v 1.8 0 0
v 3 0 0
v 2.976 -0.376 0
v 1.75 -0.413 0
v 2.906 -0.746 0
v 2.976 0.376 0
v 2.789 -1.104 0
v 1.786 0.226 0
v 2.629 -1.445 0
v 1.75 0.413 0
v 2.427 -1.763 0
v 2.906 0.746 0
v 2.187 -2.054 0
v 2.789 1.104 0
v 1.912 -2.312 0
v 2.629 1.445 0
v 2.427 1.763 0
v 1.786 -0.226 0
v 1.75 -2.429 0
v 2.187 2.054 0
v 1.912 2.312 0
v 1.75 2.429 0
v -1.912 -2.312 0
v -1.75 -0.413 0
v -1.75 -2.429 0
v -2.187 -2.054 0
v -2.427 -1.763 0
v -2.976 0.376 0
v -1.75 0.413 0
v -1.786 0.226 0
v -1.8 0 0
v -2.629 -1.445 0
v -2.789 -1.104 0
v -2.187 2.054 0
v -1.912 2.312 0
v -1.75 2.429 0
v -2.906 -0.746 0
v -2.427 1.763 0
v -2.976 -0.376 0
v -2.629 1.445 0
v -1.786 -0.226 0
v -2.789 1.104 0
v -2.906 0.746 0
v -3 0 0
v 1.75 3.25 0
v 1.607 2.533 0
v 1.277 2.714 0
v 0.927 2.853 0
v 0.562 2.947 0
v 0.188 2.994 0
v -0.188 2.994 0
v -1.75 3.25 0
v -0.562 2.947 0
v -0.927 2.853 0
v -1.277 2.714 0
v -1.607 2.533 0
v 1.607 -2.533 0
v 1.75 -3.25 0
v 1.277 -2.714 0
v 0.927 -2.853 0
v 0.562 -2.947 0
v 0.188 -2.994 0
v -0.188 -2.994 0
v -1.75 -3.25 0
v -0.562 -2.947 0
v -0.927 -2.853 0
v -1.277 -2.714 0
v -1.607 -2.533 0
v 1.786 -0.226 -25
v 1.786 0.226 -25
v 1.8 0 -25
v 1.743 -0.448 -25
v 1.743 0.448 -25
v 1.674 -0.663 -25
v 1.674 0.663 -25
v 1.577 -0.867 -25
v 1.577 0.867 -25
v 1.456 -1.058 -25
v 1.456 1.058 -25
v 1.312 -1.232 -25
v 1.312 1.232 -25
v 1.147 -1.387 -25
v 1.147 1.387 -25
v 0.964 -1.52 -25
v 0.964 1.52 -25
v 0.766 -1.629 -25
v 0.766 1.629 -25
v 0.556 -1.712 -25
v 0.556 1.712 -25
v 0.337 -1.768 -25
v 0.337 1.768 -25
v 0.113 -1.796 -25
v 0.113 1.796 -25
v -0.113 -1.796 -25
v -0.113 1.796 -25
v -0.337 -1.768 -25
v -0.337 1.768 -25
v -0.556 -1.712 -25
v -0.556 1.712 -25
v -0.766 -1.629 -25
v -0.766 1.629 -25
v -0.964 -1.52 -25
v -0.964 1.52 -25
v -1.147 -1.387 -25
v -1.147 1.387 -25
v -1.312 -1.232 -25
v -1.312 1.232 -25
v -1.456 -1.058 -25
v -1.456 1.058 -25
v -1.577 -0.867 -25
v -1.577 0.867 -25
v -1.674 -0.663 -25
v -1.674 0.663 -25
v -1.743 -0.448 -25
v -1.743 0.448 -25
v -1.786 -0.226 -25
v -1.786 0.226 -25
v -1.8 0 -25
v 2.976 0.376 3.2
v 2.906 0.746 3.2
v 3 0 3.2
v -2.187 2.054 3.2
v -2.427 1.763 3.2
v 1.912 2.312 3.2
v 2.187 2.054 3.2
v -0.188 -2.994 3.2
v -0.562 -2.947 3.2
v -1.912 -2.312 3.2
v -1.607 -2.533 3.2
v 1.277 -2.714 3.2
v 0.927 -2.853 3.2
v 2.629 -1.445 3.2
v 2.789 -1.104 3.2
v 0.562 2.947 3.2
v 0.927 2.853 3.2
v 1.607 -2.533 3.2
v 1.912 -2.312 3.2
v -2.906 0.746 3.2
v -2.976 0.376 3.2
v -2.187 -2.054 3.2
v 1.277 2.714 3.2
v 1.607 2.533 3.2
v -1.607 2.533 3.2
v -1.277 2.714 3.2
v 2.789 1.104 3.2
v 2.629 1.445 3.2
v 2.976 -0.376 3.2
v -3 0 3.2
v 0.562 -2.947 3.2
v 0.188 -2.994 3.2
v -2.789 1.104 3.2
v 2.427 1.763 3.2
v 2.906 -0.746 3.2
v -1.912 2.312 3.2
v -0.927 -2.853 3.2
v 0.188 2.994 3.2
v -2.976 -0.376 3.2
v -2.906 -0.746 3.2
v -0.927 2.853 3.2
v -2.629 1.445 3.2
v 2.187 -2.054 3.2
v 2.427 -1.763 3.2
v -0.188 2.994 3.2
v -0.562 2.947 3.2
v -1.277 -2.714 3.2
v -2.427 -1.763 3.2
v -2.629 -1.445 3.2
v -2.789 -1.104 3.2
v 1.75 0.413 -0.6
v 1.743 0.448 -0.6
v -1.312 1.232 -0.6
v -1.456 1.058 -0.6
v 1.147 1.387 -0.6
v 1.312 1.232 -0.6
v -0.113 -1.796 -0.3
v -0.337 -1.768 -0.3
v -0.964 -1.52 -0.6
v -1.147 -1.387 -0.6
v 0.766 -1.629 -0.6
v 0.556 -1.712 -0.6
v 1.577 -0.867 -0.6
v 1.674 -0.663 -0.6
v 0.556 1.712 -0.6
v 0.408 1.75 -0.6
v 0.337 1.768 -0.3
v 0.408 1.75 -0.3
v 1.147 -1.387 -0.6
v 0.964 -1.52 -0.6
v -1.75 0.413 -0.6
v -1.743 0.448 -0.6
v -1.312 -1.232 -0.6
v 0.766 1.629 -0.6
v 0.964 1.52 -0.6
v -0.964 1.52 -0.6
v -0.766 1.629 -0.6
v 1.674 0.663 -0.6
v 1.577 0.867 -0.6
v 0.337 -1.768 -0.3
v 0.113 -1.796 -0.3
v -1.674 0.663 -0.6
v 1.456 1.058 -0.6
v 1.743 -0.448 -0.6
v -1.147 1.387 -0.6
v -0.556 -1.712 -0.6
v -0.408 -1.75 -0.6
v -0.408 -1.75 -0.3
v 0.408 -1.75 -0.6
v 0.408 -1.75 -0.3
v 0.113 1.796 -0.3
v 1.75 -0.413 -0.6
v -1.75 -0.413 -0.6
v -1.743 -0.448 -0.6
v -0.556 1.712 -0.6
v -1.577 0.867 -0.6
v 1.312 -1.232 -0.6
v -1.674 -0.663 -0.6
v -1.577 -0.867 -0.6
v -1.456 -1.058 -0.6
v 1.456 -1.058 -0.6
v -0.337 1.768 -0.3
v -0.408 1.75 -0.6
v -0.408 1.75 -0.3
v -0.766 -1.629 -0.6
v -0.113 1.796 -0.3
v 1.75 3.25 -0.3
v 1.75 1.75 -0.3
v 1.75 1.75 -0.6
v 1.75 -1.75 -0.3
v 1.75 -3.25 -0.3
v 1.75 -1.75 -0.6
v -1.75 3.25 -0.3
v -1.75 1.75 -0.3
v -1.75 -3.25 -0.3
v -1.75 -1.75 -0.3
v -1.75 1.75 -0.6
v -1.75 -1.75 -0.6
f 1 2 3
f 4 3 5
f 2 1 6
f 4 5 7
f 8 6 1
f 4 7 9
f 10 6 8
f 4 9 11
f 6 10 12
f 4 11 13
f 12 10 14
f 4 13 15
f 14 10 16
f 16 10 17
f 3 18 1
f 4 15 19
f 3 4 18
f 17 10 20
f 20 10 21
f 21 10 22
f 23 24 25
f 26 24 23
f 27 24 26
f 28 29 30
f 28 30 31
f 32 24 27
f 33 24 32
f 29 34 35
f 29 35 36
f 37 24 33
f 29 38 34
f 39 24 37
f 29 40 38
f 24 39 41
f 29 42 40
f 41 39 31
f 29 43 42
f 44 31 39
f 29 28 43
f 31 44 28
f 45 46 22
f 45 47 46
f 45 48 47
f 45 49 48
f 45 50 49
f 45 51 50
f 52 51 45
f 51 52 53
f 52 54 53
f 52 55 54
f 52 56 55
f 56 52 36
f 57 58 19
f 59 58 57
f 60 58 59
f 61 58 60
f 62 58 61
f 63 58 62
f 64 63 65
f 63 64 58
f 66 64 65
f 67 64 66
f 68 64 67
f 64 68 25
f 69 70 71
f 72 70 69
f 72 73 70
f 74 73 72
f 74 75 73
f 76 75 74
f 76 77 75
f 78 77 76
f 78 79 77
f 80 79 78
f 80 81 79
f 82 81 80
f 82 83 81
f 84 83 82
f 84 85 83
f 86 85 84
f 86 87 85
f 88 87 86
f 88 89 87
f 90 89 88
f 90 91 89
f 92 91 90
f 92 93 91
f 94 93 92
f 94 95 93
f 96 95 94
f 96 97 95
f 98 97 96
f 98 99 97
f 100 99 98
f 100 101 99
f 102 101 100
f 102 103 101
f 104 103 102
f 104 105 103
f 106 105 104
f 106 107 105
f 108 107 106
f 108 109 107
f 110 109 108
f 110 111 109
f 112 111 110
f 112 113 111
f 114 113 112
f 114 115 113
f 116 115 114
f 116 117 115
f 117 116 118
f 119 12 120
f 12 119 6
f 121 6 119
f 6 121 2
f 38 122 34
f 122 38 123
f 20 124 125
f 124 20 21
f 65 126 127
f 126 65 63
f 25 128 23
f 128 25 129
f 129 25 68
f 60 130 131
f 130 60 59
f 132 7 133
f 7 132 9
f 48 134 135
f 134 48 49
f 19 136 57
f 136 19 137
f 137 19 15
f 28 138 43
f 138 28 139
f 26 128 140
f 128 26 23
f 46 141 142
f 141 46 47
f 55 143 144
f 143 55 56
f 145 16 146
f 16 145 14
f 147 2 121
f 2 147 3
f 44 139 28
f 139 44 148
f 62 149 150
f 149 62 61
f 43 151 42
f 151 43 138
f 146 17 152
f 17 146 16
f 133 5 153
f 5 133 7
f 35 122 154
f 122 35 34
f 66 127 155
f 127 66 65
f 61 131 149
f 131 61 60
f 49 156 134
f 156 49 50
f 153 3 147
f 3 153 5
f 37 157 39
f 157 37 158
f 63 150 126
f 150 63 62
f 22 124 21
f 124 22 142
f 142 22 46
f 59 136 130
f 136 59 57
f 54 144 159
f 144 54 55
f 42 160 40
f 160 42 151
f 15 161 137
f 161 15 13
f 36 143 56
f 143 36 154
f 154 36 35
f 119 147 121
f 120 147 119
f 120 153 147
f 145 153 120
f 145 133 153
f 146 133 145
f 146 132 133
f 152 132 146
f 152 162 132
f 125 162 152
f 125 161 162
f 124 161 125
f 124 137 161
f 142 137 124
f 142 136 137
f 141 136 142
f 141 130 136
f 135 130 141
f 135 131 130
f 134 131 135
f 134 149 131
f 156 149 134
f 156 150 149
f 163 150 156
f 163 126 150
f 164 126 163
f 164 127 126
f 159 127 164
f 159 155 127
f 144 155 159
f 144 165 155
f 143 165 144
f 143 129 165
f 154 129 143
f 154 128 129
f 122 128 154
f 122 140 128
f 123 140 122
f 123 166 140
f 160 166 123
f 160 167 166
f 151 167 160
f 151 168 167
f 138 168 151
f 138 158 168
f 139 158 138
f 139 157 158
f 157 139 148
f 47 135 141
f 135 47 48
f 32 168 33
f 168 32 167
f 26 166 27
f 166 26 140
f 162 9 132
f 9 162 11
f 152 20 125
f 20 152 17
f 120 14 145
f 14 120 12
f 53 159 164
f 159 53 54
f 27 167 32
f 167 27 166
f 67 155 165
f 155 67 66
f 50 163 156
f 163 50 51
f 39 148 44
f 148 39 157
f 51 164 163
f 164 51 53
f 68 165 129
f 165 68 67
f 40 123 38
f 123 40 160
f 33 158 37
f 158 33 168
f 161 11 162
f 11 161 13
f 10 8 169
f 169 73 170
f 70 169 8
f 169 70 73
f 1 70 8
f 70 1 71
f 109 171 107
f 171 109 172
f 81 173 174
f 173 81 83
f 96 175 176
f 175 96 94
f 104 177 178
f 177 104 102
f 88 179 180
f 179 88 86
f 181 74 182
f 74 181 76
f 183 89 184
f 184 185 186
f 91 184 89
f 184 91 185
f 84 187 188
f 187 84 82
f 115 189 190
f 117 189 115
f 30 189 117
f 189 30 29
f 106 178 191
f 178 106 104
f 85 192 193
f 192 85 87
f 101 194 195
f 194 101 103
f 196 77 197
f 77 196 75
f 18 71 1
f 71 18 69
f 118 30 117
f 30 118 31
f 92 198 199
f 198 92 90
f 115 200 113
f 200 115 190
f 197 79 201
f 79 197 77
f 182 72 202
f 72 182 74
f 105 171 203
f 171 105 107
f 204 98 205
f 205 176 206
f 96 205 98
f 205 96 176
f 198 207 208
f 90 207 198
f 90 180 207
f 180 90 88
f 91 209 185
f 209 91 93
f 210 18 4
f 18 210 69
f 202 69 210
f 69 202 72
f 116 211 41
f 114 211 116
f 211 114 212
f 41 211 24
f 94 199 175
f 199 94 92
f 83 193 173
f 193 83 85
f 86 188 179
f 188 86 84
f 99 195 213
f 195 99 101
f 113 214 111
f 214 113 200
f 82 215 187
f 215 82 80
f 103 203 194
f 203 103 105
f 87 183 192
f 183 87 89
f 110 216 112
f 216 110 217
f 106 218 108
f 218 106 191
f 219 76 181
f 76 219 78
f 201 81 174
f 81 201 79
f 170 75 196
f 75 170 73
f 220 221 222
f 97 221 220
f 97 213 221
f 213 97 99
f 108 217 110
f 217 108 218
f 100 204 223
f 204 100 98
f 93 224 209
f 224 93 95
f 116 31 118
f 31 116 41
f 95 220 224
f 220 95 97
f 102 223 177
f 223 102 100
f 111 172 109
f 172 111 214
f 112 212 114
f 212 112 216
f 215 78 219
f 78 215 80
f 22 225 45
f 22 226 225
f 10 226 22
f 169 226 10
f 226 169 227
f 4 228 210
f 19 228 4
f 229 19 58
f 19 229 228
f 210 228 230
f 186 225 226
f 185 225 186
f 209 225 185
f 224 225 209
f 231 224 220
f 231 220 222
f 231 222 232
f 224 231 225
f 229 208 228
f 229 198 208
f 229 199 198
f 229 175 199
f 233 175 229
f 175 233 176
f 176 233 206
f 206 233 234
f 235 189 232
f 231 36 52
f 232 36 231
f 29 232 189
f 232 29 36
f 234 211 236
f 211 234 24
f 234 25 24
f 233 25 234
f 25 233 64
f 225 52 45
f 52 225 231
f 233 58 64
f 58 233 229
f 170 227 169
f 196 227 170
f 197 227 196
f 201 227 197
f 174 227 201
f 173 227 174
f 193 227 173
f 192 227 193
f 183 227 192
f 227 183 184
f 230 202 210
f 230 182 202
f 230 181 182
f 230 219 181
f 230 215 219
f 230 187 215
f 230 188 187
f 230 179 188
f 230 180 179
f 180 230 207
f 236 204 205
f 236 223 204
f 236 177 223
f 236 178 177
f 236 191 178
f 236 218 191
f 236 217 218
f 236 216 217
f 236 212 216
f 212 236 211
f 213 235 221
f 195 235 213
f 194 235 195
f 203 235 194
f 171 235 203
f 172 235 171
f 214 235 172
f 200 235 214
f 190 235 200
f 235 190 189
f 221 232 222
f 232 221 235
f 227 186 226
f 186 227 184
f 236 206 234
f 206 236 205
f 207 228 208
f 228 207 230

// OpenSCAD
$fn = 50;


difference() {
	union() {
		translate(v = [0, 0, 0]) {
			rotate(a = [0, 0, 0]) {
				difference() {
					union() {
						translate(v = [0, 0, -25.0000000000]) {
							cylinder(h = 25, r = 1.5000000000);
						}
						cylinder(h = 3.2000000000, r = 3.0000000000);
						translate(v = [0, 0, -25.0000000000]) {
							cylinder(h = 25, r = 1.8000000000);
						}
						translate(v = [-1.7500000000, -3.2500000000, -0.3000000000]) {
							cube(size = [3.5000000000, 6.5000000000, 0.3000000000]);
						}
						translate(v = [-1.7500000000, -1.7500000000, -0.6000000000]) {
							cube(size = [3.5000000000, 3.5000000000, 0.3000000000]);
						}
						translate(v = [0, 0, -25.0000000000]) {
							cylinder(h = 25, r = 1.5000000000);
						}
					}
					union();
				}
			}
		}
	}
	union();
}
